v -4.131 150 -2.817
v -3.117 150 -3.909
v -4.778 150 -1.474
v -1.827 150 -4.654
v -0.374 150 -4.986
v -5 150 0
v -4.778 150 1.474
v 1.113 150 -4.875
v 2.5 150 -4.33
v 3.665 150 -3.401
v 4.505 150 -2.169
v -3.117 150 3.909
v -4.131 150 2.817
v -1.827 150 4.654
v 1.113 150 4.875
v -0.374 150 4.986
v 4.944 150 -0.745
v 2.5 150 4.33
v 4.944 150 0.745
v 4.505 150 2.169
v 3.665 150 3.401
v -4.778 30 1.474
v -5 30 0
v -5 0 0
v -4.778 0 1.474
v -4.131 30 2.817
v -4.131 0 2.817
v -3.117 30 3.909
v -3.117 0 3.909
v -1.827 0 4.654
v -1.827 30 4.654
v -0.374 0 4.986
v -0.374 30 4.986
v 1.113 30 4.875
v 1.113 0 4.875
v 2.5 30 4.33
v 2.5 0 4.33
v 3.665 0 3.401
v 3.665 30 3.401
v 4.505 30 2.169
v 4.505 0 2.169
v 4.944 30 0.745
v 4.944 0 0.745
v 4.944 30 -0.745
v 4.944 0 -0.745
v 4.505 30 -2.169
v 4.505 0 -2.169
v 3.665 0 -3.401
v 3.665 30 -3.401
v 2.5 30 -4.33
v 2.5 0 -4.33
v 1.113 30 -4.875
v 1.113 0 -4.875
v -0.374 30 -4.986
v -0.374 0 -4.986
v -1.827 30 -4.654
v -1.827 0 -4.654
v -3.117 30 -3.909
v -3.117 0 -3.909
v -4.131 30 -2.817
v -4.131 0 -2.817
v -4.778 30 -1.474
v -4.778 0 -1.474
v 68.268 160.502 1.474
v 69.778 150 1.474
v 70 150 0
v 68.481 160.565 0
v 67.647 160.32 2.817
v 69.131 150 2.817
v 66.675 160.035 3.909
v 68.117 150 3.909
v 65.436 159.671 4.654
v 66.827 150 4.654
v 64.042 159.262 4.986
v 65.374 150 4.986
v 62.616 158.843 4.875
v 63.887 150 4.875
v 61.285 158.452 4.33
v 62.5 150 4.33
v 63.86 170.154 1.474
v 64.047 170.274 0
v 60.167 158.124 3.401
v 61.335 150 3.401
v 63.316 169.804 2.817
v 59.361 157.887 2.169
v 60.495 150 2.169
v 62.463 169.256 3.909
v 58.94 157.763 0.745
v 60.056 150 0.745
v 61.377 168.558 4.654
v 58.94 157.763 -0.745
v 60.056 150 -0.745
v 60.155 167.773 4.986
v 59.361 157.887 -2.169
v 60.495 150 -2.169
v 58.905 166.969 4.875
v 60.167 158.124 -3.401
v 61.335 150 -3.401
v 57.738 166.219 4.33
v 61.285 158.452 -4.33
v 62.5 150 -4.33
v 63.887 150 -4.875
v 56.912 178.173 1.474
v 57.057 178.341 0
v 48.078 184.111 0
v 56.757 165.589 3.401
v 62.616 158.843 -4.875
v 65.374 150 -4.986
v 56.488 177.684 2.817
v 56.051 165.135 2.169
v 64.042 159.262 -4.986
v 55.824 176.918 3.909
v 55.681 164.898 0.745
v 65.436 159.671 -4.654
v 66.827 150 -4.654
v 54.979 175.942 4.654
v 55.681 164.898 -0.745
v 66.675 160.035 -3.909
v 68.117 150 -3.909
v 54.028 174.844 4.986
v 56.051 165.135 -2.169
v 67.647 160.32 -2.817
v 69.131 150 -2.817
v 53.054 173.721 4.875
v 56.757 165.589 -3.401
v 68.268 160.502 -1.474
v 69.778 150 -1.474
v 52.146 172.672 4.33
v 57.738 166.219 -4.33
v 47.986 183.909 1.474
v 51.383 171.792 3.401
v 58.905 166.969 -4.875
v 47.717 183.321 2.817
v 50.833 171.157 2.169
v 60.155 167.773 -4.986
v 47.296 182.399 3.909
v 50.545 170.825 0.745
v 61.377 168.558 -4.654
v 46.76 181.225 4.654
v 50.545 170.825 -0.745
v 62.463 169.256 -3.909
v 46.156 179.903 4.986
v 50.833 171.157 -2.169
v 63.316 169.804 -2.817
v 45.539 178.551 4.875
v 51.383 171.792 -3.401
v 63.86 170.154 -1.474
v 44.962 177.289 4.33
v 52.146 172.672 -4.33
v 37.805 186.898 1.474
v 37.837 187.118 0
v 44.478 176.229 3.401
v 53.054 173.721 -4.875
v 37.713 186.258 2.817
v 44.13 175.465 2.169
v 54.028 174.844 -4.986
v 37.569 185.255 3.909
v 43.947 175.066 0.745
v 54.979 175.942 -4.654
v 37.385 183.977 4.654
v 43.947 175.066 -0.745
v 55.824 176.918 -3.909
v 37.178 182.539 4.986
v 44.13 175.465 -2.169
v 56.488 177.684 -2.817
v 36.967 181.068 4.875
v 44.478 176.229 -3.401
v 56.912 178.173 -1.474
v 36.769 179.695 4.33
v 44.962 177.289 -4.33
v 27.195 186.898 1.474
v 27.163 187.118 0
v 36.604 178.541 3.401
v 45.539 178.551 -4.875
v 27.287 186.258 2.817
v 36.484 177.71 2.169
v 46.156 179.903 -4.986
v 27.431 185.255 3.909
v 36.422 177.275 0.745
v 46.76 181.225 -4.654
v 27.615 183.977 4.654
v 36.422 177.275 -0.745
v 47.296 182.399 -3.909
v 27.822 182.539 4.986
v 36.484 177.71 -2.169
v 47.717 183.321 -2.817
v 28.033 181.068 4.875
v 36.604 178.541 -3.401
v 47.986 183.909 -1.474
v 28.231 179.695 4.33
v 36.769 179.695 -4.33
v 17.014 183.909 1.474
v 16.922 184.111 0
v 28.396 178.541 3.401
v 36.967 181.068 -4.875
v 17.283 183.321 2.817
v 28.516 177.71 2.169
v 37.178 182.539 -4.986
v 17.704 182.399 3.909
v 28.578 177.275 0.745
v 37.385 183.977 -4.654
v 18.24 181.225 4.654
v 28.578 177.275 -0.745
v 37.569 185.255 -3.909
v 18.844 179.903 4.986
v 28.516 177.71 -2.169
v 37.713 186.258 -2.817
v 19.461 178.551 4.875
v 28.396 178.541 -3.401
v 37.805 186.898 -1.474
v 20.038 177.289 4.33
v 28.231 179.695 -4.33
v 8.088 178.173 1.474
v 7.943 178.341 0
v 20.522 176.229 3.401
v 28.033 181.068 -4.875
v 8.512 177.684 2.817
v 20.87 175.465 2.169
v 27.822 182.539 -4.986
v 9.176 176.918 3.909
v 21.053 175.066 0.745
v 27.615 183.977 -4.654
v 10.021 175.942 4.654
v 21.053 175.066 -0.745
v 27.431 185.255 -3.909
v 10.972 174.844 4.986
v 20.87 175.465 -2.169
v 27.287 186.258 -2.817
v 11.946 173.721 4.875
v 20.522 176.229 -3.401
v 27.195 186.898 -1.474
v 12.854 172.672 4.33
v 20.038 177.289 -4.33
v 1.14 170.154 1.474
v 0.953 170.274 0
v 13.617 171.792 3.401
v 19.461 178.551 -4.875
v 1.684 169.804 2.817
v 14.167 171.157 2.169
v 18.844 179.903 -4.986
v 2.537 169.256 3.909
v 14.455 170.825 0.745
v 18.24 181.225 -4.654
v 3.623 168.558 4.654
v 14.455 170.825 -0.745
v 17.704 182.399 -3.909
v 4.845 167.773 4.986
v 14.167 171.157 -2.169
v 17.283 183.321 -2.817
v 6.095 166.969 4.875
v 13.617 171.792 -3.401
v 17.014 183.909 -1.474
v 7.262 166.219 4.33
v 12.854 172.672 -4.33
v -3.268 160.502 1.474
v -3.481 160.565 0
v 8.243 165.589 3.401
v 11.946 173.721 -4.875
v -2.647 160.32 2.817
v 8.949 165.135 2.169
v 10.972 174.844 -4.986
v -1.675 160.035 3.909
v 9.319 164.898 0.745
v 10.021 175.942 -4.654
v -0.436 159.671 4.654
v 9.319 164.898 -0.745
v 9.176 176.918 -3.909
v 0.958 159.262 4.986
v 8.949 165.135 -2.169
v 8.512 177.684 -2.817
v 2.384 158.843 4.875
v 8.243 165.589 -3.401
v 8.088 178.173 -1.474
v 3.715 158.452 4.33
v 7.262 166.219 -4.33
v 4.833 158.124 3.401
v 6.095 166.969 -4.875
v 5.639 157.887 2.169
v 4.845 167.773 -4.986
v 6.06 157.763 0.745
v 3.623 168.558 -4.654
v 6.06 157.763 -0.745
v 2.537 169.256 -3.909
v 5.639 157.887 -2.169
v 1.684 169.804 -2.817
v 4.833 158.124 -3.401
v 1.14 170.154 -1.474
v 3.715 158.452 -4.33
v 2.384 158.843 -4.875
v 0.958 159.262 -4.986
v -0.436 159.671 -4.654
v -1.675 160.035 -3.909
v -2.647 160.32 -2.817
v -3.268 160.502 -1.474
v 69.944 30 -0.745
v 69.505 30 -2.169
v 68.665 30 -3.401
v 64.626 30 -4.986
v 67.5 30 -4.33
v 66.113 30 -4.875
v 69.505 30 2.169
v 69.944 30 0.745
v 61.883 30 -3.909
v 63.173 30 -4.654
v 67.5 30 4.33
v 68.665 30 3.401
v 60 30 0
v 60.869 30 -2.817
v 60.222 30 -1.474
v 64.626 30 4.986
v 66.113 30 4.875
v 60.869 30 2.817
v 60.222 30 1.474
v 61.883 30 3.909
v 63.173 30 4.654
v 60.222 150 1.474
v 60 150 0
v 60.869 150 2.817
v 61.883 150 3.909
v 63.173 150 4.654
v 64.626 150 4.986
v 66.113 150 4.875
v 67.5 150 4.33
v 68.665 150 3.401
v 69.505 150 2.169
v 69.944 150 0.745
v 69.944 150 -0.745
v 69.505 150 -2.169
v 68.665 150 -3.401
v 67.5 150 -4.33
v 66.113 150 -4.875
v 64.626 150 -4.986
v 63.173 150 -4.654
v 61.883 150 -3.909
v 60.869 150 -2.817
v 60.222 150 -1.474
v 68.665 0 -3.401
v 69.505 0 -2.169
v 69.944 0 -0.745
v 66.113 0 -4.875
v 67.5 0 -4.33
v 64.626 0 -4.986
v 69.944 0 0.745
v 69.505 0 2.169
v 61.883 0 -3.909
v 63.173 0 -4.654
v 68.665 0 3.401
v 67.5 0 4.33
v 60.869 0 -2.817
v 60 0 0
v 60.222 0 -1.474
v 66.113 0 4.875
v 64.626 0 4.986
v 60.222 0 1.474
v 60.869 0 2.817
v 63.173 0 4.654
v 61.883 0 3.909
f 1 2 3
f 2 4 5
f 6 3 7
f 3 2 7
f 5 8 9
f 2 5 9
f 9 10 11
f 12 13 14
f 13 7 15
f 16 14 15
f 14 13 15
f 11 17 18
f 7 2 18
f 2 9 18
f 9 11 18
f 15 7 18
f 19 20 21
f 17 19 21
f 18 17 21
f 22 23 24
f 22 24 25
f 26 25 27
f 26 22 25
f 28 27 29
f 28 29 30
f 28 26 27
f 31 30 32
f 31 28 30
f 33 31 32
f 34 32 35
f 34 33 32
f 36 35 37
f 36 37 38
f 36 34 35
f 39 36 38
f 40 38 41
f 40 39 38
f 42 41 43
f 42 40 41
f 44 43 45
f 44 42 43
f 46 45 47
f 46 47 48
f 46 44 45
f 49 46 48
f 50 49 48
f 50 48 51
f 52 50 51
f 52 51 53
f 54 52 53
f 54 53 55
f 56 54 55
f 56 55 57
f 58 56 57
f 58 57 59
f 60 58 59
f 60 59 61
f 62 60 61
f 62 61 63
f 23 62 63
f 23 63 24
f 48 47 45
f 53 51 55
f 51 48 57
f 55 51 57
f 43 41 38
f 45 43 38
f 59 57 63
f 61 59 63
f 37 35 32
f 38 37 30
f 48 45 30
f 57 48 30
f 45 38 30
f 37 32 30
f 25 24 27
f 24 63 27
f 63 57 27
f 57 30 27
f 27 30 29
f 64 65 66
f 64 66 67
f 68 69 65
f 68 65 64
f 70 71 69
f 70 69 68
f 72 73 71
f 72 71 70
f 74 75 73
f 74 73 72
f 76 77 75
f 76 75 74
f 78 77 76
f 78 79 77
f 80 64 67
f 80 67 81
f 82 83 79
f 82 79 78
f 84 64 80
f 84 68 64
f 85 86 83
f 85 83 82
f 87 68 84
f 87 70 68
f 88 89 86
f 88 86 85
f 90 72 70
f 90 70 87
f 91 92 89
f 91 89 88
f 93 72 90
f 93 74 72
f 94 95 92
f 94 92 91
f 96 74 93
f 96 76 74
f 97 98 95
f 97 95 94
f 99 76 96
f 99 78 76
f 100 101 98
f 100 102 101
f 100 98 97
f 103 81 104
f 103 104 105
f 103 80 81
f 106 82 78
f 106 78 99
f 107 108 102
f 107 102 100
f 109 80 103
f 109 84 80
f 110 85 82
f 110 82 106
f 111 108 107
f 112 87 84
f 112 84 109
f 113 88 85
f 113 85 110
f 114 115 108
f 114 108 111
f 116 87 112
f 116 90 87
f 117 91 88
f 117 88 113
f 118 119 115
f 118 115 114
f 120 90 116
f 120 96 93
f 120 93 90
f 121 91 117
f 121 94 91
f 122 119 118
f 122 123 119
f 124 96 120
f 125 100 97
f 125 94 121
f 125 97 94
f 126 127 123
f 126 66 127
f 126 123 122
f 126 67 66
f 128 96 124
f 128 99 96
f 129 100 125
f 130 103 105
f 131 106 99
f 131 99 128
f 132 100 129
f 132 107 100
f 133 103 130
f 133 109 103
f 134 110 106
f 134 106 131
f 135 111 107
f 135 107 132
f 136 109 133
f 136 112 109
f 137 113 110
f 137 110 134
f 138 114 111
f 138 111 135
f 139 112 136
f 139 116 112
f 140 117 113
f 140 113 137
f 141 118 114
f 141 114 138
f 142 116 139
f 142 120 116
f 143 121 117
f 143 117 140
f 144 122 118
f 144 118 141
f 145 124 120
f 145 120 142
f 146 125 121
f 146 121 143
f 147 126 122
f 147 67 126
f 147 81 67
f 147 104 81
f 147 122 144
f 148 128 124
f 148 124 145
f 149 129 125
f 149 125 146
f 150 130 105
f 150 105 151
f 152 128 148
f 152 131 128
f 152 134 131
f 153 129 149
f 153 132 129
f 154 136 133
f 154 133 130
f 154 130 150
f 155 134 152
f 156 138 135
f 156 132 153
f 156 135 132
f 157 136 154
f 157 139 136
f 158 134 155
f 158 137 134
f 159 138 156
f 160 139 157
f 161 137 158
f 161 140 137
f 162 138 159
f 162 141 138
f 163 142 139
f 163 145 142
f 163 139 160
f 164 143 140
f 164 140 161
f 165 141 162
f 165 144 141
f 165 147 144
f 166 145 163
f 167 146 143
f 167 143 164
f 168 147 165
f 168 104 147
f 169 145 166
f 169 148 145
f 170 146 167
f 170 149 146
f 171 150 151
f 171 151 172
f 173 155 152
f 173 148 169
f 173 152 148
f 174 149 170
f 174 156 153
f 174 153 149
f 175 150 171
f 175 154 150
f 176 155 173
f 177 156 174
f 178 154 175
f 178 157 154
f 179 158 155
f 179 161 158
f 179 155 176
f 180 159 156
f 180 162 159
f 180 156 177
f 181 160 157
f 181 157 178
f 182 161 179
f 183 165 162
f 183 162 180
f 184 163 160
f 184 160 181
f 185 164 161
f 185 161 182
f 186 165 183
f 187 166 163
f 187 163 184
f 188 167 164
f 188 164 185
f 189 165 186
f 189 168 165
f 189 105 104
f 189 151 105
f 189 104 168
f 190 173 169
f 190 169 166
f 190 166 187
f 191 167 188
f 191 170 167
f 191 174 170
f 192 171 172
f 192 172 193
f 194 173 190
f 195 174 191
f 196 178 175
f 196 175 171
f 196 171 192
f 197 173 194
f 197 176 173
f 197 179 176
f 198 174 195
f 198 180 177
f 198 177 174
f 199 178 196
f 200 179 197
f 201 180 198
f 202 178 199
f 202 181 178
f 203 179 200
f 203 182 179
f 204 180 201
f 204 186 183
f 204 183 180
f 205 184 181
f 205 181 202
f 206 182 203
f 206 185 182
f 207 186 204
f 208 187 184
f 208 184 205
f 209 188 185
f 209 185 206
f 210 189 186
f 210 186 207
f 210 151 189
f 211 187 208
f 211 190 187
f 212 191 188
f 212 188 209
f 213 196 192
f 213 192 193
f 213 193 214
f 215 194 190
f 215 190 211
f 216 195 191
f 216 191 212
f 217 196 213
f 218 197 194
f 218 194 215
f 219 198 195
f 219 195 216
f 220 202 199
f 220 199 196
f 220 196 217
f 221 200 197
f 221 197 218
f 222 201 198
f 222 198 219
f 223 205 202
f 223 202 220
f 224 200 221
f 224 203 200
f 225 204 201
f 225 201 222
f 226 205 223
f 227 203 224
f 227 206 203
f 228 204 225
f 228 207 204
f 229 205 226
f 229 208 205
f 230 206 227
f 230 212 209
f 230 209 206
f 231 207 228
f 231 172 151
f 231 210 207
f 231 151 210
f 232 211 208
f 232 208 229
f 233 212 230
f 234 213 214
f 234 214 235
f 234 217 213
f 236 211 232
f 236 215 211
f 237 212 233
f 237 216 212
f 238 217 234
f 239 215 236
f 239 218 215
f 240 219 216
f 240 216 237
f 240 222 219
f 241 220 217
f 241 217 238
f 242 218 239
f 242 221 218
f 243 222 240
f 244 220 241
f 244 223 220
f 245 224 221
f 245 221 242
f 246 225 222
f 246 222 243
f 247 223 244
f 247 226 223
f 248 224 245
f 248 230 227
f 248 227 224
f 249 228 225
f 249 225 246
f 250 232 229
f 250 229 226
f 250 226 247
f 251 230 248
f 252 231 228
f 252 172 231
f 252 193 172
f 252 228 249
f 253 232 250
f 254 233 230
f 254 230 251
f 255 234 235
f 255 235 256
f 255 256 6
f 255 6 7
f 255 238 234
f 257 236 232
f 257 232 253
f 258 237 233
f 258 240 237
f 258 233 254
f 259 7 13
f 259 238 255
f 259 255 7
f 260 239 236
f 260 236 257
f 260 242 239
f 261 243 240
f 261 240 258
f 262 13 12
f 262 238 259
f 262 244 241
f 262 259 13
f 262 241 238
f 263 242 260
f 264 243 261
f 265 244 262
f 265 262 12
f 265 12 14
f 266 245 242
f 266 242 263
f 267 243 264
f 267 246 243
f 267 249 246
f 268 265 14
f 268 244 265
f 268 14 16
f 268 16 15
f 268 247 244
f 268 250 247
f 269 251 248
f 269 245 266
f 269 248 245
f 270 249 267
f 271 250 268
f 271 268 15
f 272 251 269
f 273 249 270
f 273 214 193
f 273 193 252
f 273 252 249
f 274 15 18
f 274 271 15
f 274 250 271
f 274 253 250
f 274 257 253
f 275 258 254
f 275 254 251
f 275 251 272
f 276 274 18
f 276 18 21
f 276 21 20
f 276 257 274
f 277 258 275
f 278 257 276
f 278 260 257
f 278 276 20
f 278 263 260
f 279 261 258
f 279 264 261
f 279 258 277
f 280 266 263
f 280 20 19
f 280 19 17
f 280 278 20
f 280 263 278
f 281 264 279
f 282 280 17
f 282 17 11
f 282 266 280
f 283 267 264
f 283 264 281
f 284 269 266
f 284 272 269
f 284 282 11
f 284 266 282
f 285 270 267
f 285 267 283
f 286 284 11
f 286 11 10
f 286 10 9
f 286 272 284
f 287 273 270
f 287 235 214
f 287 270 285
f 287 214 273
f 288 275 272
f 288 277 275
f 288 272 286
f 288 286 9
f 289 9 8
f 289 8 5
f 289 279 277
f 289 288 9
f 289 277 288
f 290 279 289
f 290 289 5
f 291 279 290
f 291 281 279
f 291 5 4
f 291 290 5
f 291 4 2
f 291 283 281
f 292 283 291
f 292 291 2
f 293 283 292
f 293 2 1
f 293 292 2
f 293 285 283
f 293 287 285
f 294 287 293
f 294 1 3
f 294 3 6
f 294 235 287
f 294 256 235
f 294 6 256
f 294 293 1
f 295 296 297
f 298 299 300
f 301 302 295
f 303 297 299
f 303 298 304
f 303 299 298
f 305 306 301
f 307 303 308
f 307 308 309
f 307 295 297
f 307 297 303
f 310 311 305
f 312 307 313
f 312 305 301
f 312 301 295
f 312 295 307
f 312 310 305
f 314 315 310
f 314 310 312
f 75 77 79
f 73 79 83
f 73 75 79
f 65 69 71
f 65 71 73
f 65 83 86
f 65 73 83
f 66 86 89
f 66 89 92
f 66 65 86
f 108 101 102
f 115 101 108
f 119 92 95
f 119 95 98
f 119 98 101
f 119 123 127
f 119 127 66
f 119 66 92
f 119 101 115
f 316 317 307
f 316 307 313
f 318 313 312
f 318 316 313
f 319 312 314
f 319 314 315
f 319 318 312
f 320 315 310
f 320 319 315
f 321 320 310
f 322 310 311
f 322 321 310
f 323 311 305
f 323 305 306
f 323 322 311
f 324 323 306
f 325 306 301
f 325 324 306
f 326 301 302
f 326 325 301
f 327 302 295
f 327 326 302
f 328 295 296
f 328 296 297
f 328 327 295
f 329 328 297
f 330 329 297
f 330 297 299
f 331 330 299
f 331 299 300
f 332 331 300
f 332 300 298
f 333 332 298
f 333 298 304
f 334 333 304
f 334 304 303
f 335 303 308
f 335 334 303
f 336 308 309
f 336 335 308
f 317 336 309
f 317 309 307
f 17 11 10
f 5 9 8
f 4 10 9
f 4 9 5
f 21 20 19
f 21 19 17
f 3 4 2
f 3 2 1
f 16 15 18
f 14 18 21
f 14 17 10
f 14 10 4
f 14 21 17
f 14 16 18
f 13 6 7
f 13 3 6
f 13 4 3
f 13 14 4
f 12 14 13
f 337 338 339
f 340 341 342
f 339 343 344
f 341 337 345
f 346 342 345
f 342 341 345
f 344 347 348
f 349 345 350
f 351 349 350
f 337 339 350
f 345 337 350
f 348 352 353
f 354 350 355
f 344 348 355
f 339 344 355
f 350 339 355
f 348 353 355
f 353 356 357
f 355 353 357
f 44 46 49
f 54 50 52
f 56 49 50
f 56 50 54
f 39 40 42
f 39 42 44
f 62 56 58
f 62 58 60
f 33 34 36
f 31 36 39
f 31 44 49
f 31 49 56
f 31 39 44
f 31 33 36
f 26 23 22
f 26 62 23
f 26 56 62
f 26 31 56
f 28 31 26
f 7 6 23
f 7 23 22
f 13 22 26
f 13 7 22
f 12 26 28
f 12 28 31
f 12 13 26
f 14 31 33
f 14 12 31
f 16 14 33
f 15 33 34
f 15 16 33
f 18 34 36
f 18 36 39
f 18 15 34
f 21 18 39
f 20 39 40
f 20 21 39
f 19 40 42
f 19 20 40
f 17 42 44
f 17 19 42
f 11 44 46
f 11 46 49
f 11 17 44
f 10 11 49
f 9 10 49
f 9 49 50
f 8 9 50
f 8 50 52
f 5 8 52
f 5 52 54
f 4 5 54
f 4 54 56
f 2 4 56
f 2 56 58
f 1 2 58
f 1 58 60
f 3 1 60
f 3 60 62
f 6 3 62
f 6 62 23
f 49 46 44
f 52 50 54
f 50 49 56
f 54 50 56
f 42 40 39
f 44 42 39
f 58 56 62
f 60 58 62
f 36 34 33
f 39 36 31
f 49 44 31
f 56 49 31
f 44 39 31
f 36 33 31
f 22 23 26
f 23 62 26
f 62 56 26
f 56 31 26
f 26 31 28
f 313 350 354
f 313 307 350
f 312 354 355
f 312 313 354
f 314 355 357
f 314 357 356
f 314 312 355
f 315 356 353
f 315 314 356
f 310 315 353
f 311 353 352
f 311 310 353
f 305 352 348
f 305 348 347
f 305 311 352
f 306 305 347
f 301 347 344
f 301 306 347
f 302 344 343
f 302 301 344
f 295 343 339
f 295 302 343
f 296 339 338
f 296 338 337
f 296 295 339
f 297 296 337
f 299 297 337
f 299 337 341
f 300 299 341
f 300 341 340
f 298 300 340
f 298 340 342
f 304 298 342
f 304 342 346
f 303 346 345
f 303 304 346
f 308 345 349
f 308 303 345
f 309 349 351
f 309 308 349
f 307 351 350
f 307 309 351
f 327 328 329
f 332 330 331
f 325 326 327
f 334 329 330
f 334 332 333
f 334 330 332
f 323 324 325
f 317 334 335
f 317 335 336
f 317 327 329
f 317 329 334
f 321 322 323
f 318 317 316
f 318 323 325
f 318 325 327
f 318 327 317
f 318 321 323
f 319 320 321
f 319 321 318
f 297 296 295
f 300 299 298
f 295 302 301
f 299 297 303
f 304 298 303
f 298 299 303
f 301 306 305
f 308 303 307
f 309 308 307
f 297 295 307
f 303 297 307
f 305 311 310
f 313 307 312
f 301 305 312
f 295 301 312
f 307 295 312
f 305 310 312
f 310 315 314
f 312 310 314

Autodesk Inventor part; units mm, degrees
sketch "Sketch1" plane through (0, 0, 0) normal (0, 0, 1) x (1, 0, 0)
  line L0 (0, 0) -> (0, 150)
  line L1 (65, 0) -> (65, 150)
  line L2 (0, 0) -> (65, 0)
  arc A0 (65, 150) -> (0, 150) centre (32.5, 150) ccw
  line L3 (65, 0) -> (65, 30)
  line L4 (0, 0) -> (0, 30)
  line L5 (0, 150) -> (65, 150)
  dimension "d40" = 150
  dimension "d51" = 65
  dimension "d55" = 65
  dimension "d56" = 30
  dimension "d57" = 30
ref_plane "Work Plane1" through (0, 150, 0) normal (0, 1, 0) x (-1, 0, 0)
sketch "Sketch2" plane through (0, 150, 0) normal (0, 1, 0) x (-1, 0, 0)
  circle A0 centre (0, 0) radius 5
  dimension "d2" = 10
ref_plane "Work Plane2" through (65, 150, 0) normal (0, 1, 0) x (-1, 0, 0)
sketch "Sketch3" plane through (65, 150, 0) normal (0, 1, 0) x (-1, 0, 0)
  circle A0 centre (0, 0) radius 5
  point P0 (65, 0)
  dimension "d3" = 10
ref_plane "Work Plane3" through (0, 0, 0) normal (0, 1, 0) x (-1, 0, 0)
sketch "Sketch4" plane through (0, 0, 0) normal (0, 1, 0) x (-1, 0, 0)
  circle A0 centre (0, 0) radius 5
  dimension "d4" = 10
ref_plane "Work Plane4" through (65, 0, 0) normal (0, 1, 0) x (-1, 0, 0)
sketch "Sketch5" plane through (65, 0, 0) normal (0, 1, 0) x (-1, 0, 0)
  circle A0 centre (0, 0) radius 5
  point P0 (65, 0)
  dimension "d5" = 10
ref_plane "Work Plane6" through (30, 0, 0) normal (1, 0, 0) x (0, 1, 0)
sketch "Sketch6" plane through (30, 0, 0) normal (1, 0, 0) x (0, 1, 0)
  point P0 (0, 0)
sketch "Sketch7" plane through (30, 0, 0) normal (1, 0, 0) x (0, 1, 0)
  point P0 (0, 0)
sketch "Sketch11" plane through (30, 0, 0) normal (1, 0, 0) x (0, 1, 0)
  point P0 (0, 0)
sketch "Sketch13" plane through (30, 0, 0) normal (1, 0, 0) x (0, 1, 0)
  point P0 (0, 0)
ref_plane "Work Plane10" through (0, 30, 0) normal (0, 1, 0) x (-1, 0, 0)
ref_plane "Work Plane13" through (65, 30, 0) normal (0, 1, 0) x (-1, 0, 0)
sketch "Sketch17" plane through (65, 30, 0) normal (0, 1, 0) x (-1, 0, 0)
  circle A0 centre (0, 0) radius 5
  point P0 (65, 0)
  dimension "d81" = 10
sketch "Sketch18" plane through (0, 30, 0) normal (0, 1, 0) x (-1, 0, 0)
  circle A0 centre (0, 0) radius 5
  dimension "d82" = 10
loft "Loft10" add profiles "Sketch5", "Sketch17"
loft "Loft11" add profiles "Sketch4", "Sketch18"
thread "Thread3" size "M10x1.5" class "6g" standard "ANSI Metric M Profile" full length
thread "Thread4" size "M10x1.5" class "6g" standard "ANSI Metric M Profile" full length
extrude "Extrusion3" add sketch "Sketch2" against normal blind 120 separate body
extrude "Extrusion4" add sketch "Sketch3" against normal blind 120 separate body
sweep "Sweep3" add profiles "Sketch2" path "Sketch1" separate body path curves A0
properties part number "U BOLT" material "Steel, Mild"
